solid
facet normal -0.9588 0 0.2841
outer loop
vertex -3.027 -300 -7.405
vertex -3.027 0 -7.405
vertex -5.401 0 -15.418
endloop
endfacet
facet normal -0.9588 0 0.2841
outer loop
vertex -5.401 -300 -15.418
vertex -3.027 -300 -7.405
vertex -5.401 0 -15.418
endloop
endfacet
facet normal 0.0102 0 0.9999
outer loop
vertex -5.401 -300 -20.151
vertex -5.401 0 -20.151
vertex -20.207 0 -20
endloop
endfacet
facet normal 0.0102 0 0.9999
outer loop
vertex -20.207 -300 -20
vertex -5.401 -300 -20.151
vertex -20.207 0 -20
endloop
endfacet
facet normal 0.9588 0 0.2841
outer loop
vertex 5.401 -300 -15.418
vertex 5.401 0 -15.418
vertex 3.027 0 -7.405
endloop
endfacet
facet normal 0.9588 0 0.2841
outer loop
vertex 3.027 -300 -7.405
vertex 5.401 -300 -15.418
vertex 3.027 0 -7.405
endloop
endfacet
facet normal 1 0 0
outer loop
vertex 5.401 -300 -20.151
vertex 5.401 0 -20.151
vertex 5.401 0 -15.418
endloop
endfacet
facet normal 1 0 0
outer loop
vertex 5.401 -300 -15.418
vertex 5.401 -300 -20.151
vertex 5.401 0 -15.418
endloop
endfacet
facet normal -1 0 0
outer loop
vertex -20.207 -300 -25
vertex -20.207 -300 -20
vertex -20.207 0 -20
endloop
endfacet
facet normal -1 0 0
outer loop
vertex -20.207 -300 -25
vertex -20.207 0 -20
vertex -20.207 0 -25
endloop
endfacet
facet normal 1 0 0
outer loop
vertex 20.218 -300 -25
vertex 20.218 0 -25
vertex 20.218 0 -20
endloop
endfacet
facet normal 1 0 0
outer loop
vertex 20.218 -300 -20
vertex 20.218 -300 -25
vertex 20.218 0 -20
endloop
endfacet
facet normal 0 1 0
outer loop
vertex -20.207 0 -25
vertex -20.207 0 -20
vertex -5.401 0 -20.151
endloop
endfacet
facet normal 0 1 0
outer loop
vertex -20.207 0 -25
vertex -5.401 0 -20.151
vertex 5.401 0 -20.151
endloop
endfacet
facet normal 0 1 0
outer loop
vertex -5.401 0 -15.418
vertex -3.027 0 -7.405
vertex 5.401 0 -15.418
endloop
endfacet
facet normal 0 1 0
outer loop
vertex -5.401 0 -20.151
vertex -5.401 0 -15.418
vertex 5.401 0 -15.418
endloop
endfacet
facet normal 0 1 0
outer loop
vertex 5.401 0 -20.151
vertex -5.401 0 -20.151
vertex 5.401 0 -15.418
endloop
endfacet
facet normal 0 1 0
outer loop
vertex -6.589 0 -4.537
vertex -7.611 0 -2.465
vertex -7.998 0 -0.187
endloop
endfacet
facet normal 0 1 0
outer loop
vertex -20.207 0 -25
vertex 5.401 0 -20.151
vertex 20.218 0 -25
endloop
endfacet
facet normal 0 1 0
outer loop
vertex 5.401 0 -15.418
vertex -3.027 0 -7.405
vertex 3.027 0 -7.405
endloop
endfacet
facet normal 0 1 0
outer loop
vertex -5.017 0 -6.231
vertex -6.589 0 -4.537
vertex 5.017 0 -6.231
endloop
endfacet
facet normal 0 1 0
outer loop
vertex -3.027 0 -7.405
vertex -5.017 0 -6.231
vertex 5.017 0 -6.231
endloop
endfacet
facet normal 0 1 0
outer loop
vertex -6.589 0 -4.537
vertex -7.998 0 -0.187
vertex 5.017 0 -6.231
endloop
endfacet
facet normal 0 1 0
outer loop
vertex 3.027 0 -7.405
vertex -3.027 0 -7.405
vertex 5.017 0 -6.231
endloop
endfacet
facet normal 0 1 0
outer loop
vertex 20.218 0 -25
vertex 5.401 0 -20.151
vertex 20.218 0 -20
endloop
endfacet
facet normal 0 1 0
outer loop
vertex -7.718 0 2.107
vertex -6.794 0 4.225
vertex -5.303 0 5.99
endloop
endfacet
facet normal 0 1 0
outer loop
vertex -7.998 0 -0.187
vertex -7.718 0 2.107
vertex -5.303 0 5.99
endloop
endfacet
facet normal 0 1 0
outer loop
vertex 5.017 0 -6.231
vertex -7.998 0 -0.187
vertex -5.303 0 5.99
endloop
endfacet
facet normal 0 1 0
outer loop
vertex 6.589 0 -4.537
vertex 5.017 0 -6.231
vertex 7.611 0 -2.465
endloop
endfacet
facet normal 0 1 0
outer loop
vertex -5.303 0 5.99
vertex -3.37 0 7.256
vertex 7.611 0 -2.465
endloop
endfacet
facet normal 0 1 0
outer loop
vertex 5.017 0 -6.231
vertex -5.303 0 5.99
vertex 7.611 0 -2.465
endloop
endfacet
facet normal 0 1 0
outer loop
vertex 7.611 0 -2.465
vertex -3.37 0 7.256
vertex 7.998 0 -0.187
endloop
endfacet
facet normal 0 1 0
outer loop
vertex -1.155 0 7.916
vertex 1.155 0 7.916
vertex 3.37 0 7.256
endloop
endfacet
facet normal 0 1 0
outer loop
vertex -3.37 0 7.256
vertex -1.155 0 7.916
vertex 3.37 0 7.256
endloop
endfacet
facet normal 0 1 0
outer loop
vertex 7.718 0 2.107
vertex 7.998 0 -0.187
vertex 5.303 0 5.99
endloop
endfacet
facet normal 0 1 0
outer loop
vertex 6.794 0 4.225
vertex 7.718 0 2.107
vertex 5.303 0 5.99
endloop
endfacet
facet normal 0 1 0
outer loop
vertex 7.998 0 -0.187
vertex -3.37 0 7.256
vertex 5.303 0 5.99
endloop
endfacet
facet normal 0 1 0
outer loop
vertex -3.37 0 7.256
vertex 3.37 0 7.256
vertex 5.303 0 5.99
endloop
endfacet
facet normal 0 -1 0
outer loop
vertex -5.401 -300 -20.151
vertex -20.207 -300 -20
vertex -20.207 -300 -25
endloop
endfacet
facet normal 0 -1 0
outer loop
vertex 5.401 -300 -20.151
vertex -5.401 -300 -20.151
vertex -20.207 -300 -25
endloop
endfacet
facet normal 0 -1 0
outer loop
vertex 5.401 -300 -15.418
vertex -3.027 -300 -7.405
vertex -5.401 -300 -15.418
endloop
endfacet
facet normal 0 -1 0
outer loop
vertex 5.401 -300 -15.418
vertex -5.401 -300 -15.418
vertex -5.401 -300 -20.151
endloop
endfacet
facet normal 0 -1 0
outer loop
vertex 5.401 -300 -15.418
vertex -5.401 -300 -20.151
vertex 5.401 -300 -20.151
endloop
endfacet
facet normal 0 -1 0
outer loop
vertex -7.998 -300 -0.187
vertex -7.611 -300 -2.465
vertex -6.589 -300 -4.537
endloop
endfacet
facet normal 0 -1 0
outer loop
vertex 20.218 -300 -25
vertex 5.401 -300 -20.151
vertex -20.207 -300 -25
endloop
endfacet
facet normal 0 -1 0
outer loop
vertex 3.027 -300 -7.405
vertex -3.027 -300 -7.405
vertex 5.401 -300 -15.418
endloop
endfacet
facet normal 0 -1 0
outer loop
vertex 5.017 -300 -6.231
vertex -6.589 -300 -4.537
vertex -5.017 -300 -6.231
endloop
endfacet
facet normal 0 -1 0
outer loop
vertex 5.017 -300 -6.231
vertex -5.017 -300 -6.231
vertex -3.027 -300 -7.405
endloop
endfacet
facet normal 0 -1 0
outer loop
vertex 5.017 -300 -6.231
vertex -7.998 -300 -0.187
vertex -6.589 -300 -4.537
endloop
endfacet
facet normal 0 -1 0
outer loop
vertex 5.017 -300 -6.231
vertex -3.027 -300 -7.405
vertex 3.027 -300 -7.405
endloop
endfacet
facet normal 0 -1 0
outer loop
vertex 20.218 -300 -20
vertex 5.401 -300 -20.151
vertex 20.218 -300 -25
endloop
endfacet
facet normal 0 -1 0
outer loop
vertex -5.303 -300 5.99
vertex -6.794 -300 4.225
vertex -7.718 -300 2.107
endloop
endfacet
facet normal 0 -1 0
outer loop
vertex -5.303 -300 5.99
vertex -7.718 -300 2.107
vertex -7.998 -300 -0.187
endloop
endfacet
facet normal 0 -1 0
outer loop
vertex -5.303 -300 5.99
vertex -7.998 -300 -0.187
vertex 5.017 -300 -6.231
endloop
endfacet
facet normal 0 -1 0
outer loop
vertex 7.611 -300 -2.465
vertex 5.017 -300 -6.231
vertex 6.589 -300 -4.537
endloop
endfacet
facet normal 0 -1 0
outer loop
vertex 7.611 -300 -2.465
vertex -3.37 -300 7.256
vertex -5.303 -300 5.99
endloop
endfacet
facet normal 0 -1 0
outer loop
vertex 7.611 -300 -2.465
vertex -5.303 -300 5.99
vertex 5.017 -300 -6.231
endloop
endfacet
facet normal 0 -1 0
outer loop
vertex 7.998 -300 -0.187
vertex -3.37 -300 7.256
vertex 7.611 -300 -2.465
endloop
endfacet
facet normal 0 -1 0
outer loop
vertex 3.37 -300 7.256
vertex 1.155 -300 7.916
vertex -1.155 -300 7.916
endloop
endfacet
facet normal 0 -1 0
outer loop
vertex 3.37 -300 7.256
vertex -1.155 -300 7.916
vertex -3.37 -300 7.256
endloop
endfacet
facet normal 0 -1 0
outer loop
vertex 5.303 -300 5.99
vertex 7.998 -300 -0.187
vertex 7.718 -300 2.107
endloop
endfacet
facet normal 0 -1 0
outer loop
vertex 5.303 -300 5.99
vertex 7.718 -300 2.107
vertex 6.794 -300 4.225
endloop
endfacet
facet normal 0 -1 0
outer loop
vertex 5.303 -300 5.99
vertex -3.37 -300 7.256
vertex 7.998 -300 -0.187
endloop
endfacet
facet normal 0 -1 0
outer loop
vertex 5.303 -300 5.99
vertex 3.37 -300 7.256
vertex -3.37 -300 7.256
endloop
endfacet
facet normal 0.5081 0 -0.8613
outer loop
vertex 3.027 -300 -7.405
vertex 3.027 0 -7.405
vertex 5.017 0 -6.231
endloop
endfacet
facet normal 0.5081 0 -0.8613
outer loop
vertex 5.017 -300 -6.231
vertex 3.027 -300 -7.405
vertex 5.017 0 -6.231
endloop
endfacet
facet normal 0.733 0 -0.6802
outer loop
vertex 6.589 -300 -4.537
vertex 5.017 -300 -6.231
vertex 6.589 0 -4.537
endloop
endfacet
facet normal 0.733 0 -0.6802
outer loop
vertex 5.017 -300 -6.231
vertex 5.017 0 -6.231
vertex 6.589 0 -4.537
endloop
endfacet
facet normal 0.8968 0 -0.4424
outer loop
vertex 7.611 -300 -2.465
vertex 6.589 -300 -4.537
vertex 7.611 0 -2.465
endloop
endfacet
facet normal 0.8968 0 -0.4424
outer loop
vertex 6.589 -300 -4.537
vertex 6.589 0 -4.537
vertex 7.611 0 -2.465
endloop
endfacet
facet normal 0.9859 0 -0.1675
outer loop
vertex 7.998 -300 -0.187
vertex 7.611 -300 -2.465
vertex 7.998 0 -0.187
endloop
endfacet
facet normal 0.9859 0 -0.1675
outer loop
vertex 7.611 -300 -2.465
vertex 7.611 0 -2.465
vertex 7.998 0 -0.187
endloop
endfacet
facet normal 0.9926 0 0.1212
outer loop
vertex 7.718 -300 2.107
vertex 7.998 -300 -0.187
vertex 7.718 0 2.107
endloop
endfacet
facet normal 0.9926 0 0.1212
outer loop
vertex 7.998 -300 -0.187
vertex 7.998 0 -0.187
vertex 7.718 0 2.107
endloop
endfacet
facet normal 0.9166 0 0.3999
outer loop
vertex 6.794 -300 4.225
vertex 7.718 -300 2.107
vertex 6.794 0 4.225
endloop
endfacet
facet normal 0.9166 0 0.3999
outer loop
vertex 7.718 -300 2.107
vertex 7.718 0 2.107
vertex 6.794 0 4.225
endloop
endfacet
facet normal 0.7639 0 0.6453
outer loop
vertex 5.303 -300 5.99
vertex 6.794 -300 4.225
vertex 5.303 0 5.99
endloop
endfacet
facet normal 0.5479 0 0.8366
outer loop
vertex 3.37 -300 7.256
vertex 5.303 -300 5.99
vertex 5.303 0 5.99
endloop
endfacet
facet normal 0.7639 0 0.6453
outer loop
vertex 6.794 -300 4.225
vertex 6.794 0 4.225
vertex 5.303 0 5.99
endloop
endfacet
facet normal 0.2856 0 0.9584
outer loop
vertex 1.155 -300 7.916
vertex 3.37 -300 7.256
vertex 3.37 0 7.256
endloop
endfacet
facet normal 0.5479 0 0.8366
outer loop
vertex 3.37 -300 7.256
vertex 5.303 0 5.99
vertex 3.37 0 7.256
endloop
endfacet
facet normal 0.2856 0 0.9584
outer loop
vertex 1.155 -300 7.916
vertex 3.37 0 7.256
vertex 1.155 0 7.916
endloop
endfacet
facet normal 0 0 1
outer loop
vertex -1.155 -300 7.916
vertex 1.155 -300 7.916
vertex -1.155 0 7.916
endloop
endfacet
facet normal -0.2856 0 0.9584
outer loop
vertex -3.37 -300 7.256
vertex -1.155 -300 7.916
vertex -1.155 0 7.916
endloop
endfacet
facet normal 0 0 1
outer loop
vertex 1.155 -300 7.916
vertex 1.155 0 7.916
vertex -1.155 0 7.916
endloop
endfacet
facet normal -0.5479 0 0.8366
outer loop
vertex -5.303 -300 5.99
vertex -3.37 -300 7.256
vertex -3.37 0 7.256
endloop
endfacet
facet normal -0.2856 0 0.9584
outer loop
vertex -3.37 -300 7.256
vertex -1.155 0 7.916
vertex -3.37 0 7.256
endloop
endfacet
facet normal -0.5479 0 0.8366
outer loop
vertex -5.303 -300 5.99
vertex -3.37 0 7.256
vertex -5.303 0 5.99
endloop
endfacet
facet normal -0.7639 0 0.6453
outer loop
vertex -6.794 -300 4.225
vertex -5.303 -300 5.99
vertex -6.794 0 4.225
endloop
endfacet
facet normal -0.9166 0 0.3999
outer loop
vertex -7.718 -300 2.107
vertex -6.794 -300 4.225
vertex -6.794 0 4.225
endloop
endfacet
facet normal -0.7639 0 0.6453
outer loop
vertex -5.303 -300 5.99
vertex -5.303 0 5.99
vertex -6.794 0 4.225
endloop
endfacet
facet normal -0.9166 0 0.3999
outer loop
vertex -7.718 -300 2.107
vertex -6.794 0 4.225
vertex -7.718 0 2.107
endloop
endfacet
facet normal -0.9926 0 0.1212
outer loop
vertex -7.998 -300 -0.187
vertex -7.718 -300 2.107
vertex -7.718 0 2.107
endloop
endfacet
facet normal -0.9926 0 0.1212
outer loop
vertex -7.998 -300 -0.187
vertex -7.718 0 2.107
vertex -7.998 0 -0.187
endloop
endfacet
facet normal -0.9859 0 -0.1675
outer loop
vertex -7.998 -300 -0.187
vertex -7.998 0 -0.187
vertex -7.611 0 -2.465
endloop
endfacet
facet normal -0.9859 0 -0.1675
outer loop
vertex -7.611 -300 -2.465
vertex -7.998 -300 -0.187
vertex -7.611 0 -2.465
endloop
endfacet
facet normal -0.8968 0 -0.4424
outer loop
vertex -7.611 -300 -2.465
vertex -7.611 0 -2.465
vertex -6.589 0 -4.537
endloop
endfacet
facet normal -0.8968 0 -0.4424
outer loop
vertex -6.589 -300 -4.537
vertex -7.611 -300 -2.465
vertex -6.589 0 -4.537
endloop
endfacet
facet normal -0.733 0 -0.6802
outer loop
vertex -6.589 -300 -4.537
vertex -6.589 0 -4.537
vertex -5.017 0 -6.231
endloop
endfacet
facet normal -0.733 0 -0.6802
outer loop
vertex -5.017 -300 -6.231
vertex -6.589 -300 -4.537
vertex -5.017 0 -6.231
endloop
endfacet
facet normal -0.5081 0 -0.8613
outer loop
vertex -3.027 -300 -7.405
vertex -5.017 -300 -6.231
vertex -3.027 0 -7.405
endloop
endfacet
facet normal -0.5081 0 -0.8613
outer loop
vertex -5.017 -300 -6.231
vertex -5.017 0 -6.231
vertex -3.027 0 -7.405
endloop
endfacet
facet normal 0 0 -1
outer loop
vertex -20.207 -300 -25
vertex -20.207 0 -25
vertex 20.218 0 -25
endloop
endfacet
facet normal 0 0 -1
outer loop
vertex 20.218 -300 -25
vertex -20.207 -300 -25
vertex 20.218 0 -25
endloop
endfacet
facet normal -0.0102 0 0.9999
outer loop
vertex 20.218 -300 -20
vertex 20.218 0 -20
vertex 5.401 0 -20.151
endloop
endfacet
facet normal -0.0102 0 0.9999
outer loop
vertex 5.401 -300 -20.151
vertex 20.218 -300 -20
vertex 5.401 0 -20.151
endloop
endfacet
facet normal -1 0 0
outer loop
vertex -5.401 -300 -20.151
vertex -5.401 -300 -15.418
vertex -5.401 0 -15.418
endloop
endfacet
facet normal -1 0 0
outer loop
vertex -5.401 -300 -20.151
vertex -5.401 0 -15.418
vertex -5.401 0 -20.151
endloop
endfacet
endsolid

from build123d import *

# Parameters (mm, degrees)
F1_DEPTH = 300


with BuildPart() as f1:
    # F0 (on Front) → F1 (new body)
    with BuildSketch(Plane.XZ):
        with BuildLine():
            Line((5.400592, -15.418472), (3.027247, -7.405118))
            ThreePointArc((3.027247, -7.405118), (0, 8), (-3.027247, -7.405118))
            Line((-3.027247, -7.405118), (-5.400592, -15.418472))
            Line((-5.400592, -15.418472), (-5.400592, -20.151161))
            Line((-5.400592, -20.151161), (-20.206842, -20))
            Line((-20.206842, -20), (-20.206842, -25))
            Line((-20.206842, -25), (0, -25))
            Line((0, -25), (20.2184, -25))
            Line((20.2184, -25), (20.2184, -19.999882))
            Line((20.2184, -19.999882), (5.400592, -20.151161))
            Line((5.400592, -20.151161), (5.400592, -15.418472))
        make_face()
    extrude(amount=F1_DEPTH)


solid = f1.part
